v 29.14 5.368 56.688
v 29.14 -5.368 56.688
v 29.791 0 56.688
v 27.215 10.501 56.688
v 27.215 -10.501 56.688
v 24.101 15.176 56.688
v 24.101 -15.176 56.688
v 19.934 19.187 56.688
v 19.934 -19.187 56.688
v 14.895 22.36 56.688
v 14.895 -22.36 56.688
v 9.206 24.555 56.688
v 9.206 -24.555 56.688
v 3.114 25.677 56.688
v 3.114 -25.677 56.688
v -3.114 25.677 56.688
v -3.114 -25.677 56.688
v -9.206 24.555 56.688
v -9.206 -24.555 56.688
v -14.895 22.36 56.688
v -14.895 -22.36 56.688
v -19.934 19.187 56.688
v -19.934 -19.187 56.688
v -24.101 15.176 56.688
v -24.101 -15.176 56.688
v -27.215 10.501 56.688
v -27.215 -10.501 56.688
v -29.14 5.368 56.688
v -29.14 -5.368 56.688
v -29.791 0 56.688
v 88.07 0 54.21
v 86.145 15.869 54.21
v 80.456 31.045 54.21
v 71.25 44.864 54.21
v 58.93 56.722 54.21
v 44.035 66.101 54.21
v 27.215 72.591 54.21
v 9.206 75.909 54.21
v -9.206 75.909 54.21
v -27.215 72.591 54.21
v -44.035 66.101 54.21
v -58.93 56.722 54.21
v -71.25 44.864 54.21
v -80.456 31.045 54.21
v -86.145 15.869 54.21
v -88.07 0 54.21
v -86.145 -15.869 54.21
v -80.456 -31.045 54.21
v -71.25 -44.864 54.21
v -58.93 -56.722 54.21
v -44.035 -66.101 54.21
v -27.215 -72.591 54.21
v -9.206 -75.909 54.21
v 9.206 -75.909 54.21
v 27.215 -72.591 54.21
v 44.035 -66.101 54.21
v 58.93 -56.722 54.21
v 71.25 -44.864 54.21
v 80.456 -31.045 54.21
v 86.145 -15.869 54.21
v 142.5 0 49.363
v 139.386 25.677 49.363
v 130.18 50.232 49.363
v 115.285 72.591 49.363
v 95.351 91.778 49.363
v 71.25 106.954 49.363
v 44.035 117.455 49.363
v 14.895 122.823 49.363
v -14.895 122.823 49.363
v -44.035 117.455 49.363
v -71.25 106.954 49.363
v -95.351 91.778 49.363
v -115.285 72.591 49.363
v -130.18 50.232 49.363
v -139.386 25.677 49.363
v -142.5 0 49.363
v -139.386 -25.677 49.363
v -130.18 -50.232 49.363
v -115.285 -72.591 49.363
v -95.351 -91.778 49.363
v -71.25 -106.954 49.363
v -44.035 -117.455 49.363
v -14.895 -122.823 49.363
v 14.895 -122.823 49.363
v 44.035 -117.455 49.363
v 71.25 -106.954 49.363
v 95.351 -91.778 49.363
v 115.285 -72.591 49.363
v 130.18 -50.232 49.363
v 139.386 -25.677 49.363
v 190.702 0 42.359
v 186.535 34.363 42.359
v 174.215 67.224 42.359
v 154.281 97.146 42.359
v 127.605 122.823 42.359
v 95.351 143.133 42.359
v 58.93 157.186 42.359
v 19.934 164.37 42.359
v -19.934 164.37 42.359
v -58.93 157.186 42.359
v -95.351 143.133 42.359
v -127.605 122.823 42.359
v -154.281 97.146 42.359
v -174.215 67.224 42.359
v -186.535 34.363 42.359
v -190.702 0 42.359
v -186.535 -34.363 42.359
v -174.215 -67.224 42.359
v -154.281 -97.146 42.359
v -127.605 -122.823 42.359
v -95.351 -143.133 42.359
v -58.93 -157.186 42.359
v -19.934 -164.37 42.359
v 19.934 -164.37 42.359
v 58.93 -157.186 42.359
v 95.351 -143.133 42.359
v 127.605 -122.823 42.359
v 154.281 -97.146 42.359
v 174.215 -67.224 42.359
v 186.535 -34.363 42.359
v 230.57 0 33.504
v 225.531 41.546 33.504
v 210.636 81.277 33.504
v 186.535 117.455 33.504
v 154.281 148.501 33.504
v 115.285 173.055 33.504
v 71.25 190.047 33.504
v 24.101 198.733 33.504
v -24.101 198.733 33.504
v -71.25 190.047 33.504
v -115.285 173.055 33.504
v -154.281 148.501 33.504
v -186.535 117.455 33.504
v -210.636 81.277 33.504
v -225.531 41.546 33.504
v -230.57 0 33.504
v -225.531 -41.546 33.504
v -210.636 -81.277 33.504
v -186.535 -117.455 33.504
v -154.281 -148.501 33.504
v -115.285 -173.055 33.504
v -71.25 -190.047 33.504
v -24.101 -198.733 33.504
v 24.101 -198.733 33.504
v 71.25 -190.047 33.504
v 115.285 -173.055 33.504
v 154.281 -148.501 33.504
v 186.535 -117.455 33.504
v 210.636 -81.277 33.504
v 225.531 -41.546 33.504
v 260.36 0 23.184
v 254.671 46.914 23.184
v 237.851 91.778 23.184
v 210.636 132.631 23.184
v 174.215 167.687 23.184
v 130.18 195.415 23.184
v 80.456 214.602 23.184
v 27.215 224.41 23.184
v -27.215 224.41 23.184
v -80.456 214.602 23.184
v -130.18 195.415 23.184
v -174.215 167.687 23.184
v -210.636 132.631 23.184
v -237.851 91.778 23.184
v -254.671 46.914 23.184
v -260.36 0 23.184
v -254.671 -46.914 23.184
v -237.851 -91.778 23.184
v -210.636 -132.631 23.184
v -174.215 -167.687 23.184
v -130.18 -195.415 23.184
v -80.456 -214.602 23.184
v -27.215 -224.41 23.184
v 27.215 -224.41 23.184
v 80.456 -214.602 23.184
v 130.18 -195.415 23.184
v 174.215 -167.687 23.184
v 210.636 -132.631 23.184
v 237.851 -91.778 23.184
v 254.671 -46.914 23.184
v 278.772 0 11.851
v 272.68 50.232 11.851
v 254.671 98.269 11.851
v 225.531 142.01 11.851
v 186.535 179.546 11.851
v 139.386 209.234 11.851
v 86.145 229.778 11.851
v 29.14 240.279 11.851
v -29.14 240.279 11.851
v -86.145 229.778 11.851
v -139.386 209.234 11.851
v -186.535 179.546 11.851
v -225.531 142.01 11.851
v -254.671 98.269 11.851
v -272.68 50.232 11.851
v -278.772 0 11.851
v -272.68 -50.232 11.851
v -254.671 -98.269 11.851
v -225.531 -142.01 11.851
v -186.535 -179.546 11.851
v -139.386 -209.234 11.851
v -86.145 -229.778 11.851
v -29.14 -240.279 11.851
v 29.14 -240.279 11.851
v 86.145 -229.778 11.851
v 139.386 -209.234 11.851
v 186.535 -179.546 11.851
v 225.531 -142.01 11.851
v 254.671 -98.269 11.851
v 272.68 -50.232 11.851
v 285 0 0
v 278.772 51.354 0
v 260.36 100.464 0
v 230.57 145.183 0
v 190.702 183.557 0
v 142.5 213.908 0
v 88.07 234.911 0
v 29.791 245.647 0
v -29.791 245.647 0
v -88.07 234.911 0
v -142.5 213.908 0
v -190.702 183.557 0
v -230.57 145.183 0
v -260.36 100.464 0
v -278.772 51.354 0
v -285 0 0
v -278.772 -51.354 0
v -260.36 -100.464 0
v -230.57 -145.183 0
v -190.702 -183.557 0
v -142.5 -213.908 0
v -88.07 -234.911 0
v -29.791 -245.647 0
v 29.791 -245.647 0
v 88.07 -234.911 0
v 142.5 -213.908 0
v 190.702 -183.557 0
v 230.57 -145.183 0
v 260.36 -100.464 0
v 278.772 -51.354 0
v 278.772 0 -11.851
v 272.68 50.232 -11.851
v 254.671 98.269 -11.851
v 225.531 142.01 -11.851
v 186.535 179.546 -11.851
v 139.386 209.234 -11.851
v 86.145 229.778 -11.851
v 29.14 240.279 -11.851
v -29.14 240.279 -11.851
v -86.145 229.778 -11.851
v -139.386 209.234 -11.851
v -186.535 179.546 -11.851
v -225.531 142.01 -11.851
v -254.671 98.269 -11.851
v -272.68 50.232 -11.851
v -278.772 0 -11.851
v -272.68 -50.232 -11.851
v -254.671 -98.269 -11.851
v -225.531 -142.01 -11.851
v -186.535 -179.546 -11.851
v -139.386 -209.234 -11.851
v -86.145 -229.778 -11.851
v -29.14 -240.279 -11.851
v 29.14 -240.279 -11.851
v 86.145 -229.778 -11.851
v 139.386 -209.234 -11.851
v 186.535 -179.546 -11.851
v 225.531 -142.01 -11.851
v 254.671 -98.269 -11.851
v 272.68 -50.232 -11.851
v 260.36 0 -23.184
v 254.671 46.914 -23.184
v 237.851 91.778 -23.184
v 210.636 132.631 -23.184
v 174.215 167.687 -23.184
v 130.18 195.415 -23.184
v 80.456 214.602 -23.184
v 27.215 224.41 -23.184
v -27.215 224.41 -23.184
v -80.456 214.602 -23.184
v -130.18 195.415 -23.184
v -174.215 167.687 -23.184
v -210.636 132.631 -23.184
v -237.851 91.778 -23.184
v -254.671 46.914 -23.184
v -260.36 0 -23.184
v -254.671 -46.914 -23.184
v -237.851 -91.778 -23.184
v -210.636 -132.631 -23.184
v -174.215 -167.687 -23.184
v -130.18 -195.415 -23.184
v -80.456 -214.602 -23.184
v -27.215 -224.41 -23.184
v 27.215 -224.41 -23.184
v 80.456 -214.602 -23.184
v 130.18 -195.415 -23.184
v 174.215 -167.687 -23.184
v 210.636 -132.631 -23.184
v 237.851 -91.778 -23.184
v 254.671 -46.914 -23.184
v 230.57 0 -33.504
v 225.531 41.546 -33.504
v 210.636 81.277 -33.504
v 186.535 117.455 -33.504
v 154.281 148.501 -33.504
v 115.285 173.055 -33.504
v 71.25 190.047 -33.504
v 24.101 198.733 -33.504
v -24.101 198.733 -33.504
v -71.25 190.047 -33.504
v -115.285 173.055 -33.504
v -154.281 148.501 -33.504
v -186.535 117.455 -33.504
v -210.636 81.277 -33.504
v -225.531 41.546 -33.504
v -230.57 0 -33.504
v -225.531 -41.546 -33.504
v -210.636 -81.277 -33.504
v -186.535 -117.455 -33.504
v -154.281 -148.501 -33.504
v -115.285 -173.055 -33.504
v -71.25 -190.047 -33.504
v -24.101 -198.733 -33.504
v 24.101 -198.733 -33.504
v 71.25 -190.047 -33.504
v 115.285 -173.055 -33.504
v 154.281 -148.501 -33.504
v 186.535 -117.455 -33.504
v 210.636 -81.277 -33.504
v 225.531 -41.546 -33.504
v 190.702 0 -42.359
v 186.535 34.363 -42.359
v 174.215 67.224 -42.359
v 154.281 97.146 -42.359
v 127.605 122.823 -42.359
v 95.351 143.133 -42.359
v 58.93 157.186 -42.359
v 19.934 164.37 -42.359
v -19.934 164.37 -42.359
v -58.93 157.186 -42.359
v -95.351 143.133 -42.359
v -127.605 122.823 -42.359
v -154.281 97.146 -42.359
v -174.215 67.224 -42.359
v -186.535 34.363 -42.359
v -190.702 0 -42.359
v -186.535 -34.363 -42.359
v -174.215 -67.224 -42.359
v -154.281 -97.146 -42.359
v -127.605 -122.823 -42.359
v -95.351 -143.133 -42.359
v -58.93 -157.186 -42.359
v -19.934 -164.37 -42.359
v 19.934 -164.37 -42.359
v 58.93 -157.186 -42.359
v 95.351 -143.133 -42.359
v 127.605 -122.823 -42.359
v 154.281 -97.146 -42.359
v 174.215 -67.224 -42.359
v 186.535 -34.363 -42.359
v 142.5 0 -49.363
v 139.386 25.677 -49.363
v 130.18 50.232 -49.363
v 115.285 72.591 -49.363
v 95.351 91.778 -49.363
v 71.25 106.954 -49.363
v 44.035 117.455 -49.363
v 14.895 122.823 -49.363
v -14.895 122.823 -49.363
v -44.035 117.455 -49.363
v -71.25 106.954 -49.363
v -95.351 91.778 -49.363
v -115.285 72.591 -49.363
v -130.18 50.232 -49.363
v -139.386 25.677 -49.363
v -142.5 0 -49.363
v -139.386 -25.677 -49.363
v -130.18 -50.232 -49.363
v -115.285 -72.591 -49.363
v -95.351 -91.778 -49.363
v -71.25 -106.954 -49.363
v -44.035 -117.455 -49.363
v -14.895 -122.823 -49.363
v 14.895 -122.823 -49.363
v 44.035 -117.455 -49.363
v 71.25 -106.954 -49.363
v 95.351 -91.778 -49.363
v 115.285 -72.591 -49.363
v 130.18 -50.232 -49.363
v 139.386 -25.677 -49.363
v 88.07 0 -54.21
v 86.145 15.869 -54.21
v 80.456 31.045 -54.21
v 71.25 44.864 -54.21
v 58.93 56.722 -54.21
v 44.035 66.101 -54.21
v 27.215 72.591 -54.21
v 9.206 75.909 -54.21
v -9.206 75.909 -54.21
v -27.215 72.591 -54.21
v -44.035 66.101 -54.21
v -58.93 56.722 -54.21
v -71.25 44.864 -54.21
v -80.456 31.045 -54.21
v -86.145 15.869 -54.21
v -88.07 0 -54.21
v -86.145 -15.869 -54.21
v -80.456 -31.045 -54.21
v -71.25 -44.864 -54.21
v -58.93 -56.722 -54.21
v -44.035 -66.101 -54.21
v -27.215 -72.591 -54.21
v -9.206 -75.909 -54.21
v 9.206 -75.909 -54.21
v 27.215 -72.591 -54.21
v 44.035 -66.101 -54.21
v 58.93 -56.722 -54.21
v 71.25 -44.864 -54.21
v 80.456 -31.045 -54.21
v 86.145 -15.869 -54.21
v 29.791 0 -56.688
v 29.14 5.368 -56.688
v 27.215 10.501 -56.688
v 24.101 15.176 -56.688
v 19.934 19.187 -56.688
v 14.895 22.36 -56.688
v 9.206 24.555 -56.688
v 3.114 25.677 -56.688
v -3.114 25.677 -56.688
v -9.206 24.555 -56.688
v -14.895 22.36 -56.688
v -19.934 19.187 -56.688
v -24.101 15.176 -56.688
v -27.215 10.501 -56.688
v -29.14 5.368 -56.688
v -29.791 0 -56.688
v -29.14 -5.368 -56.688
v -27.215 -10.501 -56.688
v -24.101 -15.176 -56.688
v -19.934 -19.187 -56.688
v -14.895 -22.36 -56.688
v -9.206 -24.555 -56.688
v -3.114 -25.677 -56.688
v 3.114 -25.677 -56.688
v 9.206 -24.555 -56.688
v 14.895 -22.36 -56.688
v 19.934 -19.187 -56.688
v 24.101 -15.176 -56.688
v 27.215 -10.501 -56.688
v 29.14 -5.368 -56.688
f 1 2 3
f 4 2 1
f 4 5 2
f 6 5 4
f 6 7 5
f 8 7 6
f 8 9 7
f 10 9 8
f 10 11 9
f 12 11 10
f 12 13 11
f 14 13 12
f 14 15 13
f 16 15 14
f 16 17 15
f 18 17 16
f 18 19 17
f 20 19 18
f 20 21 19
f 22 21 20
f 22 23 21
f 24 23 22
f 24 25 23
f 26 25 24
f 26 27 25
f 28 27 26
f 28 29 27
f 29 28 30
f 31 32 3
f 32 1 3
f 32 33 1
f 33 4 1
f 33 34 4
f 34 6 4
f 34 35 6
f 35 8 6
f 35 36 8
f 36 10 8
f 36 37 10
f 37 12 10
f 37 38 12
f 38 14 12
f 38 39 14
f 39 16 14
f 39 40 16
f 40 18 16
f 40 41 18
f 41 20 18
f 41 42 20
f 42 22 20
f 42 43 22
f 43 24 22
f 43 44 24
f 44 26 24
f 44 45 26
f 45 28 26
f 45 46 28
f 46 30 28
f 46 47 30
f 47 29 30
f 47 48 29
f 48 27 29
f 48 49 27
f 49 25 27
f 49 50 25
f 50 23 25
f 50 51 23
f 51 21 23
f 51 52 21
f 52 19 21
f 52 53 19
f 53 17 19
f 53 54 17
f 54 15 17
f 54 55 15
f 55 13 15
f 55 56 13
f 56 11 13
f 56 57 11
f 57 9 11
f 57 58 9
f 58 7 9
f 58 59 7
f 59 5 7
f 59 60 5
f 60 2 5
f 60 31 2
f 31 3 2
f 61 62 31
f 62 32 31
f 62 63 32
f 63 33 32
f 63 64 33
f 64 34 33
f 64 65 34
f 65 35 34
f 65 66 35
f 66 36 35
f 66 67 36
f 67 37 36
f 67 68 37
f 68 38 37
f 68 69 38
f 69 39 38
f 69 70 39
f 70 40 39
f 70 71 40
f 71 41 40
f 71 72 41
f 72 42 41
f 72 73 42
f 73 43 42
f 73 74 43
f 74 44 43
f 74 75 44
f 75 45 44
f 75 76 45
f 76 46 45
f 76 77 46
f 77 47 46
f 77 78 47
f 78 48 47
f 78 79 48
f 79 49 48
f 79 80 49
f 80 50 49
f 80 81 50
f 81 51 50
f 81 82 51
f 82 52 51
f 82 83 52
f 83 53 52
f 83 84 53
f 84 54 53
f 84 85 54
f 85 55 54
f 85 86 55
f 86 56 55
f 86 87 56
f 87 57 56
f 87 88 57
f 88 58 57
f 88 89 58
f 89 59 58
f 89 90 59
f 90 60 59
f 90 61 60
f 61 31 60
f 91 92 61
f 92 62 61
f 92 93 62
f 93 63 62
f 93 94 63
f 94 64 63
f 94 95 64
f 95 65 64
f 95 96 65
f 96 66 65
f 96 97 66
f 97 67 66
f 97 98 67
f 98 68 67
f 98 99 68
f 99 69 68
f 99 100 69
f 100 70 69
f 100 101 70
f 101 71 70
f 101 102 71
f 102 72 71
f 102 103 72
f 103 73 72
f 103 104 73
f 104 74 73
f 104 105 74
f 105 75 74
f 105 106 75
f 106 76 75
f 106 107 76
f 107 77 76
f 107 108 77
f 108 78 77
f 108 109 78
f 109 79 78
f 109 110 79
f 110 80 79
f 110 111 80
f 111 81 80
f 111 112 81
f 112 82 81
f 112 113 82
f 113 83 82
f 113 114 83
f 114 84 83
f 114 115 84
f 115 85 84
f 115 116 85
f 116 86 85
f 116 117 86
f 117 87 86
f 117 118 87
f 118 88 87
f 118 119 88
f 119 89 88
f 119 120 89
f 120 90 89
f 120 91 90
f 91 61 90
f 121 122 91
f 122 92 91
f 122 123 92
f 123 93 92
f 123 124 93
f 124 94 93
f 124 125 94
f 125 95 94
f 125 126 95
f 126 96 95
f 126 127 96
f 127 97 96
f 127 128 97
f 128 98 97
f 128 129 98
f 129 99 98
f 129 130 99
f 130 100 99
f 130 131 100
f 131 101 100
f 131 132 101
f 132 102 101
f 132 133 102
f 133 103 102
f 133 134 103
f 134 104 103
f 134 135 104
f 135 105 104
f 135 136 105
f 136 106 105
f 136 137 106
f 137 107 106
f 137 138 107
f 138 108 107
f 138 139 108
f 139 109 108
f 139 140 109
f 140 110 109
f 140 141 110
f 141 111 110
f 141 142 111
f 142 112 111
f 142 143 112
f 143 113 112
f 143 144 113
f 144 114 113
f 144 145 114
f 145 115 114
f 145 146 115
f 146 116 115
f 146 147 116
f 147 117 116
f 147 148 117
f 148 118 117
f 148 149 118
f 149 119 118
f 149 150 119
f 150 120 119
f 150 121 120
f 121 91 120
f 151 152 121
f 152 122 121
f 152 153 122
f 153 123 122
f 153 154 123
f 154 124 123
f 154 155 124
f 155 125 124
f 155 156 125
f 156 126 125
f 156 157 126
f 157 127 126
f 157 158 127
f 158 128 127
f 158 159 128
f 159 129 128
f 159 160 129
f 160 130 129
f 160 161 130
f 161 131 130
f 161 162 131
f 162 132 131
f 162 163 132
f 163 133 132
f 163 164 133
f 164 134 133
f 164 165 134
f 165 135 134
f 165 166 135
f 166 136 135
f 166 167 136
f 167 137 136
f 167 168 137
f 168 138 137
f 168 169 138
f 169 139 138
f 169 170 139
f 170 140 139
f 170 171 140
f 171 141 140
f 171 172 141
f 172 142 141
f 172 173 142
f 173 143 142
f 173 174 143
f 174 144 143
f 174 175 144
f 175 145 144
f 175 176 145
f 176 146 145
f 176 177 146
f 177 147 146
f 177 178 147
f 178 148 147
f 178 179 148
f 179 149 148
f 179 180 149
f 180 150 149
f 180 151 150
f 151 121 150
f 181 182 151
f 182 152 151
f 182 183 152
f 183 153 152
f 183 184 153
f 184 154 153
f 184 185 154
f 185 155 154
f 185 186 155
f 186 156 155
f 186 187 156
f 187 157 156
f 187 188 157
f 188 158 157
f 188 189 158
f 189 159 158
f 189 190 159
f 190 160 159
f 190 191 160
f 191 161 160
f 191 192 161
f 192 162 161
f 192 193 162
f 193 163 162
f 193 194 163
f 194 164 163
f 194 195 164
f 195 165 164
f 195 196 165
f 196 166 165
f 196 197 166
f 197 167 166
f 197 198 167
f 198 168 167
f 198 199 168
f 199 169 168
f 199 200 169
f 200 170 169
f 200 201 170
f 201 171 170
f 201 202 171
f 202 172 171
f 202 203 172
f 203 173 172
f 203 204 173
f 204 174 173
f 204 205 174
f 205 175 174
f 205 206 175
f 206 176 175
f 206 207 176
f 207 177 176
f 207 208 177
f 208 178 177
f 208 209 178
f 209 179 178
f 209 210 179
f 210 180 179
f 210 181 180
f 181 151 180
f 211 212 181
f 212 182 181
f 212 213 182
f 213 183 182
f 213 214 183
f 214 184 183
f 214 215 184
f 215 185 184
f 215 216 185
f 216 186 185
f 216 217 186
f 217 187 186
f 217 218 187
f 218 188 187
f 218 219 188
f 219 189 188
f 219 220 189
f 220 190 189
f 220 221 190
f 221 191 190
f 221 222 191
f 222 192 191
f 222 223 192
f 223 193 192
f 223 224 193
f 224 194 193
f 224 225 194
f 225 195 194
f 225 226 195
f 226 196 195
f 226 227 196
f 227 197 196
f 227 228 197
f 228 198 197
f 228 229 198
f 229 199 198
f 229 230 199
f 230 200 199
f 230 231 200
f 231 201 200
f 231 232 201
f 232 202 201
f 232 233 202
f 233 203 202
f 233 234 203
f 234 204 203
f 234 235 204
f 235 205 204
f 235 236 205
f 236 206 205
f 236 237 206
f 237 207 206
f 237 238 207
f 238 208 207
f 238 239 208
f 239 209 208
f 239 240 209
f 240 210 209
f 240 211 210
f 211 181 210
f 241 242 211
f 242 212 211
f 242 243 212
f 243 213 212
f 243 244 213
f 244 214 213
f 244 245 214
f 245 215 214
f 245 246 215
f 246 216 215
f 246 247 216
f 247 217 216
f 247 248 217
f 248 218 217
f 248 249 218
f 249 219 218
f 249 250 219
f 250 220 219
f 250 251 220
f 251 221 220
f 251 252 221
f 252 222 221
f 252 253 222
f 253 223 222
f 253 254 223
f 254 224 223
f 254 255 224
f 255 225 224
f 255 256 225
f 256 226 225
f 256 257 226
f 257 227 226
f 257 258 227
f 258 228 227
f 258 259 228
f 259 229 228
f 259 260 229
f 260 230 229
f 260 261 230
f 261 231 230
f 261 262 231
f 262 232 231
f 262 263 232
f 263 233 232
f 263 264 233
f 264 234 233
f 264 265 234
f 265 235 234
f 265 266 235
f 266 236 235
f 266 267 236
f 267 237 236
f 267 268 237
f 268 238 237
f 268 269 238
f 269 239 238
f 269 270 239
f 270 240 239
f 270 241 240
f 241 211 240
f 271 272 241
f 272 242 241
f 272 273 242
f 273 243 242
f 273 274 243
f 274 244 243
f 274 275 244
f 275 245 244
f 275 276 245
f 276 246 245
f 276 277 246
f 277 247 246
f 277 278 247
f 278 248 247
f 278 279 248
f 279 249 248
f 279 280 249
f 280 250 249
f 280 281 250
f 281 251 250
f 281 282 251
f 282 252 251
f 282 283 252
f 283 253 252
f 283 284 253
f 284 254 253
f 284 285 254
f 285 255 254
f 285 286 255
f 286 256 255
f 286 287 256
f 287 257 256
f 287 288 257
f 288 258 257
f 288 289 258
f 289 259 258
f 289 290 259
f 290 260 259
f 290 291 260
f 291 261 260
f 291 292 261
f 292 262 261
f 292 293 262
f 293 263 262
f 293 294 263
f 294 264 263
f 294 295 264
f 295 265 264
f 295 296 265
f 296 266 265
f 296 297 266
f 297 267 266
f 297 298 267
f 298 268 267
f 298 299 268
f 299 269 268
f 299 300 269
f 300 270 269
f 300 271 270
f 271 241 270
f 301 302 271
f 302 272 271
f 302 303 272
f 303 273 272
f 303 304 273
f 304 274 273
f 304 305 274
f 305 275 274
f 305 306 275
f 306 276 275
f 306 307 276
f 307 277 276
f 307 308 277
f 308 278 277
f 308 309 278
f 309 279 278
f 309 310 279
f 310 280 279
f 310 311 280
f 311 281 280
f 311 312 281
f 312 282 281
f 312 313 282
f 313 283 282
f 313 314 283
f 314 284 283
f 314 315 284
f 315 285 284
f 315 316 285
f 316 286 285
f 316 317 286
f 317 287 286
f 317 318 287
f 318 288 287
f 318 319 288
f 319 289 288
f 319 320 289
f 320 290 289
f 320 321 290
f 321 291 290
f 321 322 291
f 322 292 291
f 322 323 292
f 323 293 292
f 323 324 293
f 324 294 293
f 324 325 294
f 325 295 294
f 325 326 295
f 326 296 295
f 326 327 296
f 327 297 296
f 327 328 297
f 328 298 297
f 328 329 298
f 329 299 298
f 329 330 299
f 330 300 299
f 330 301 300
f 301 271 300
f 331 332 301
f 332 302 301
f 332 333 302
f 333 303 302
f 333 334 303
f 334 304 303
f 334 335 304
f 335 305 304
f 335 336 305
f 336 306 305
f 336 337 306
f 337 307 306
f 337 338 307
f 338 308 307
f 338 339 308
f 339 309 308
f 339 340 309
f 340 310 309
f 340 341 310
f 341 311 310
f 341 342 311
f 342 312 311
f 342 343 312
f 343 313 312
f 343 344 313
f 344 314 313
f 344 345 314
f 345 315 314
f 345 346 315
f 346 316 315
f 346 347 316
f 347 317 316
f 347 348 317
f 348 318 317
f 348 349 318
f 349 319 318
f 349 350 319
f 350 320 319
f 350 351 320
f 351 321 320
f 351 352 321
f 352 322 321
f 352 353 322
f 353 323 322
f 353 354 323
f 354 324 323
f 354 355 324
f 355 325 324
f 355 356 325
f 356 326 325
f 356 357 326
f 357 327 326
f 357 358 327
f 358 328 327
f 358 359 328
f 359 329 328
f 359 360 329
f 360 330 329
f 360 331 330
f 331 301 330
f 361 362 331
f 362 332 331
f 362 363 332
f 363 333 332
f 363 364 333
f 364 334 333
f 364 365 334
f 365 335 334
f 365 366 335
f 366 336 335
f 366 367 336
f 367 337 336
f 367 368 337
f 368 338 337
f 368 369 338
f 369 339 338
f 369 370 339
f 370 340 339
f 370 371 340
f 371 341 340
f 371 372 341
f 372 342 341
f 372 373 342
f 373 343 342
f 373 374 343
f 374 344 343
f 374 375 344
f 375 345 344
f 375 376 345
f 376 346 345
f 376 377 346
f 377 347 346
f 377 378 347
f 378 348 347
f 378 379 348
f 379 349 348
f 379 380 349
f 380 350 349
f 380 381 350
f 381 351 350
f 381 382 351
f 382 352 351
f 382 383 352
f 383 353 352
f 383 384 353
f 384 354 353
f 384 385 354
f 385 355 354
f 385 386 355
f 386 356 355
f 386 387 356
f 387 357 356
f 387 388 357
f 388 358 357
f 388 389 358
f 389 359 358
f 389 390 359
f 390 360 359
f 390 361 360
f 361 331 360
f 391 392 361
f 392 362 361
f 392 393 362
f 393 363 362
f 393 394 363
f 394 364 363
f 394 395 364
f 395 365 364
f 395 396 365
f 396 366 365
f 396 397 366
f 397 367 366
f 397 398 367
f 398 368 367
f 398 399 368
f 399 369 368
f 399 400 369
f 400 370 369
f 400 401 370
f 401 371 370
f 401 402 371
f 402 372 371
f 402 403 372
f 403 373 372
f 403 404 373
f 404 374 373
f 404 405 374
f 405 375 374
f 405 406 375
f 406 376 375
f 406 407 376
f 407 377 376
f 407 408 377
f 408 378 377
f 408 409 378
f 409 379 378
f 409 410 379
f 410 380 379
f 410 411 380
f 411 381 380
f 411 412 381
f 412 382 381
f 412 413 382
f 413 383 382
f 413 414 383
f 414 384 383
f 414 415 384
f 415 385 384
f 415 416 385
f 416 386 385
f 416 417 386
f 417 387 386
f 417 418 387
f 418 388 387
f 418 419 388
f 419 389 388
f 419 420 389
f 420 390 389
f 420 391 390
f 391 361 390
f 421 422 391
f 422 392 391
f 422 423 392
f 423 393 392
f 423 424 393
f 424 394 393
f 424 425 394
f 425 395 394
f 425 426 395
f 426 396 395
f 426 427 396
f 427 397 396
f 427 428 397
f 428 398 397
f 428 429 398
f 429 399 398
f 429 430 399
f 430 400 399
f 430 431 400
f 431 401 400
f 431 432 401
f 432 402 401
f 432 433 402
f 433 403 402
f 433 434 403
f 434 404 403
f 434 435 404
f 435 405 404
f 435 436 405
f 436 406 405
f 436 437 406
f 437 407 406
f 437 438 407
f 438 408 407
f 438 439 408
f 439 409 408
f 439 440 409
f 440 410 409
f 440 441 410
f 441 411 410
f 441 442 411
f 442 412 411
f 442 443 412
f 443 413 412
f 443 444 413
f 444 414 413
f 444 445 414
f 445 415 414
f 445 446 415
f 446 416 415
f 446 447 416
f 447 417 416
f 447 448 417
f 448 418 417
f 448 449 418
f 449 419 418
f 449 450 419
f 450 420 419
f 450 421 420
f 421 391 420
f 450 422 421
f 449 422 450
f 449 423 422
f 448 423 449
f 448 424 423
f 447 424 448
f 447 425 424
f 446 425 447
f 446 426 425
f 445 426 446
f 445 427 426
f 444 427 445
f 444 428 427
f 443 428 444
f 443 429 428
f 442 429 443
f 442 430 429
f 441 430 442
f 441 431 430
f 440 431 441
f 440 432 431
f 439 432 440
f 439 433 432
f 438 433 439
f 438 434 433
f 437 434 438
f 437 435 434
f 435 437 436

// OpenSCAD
// Generated by SolidPython 1.0.1 on 2020-07-29 00:46:52


scale(v = [15, 13, 3]) {
	sphere(r = 19);
}
/***********************************************
*********      SolidPython code:      **********
************************************************
 
# import packages: SolidPython
from solid import *
from solid.utils import *
from itertools import chain, combinations, permutations


class Resize:

    def __init__(self, scad_file):
        self.scad_file = scad_file
        #self.scad_file = import_scad(scad_file)
        # cone/cylinder param:
        self.r1 = 0
        self.r2 = 0
        self.h = 0
        # rectangular prism param:
        self.w = 0
        self.l = 0
        # ellipse param:
        self.r = 0

    # import OpenScad code (file name corresponds to shape)


    # classify shape + parameters
    def assign(self, param1, param2, param3):
        if self.scad_file == 'cone.scad':
            self.r1 = param1
            self.r2 = param2
            self.h = param3
        elif self.scad_file == 'cylinder.scad':
            self.r1 = param1
            self.r2 = param2
            self.h = param3
        elif self.scad_file == 'rectangularPrism.scad':
            self.h = param1
            self.l = param2
            self.w = param3
        else:
            self.r = param1
            self.h = param2

    # resize parameters
    def iterate(self):
        x = range(3, 20, 2)
        i = 1
        if self.scad_file == 'cone.scad':
            tempList = list(permutations(x, 2))
            for temp in tempList:
                param1 = temp[0]
                param2 = temp[1]
                filepath = 'produced_scad_files/' + 'cone' + str(param1) + '_' + str(param2) + '_' + '.scad'
                scad_render_to_file(cylinder(h=param1, r1=param2, r2=0), filepath)

        elif self.scad_file == 'cylinder.scad':
            tempList = list(permutations(x, 3))
            for temp in tempList:
                param1 = temp[0]
                param2 = temp[1]
                filepath = 'produced_scad_files/' + 'cylinder' + str(param1) + '_' + str(param2) + '_' + '.scad'
                scad_render_to_file(cylinder(h=param1, r1=param2, r2=param2), filepath)

        elif self.scad_file == 'rectangularPrism.scad':
            tempList = list(permutations(x, 3))
            for temp in tempList:
                param1 = temp[0]
                param2 = temp[1]
                param3 = temp[2]
                filepath = 'produced_scad_files/' + 'rectangularPrism' + str(param1) + '_' + str(param2) + '_' + str(
                    param3) + '.scad'
                scad_render_to_file(cube(size=(param1, param2, param3)), filepath)

        elif self.scad_file == 'ellipse.scad':
            tempList = list(permutations(x, 4))
            for temp in tempList:
                param1 = temp[0]
                param2 = temp[1]
                param3 = temp[2]
                param4 = temp[3]
                filepath = 'produced_scad_files/' + 'ellipse' + str(param1) + '_' + str(param2) + '_' + str(param3) + '_' + str(param4) + '.scad'
                scad_render_to_file(scale([param1, param2, param3])(sphere(r=param4)), filepath)

    def render_to_scadfile(self):
        scad_render_to_file(scad, 'example.scad') 
 
************************************************/
